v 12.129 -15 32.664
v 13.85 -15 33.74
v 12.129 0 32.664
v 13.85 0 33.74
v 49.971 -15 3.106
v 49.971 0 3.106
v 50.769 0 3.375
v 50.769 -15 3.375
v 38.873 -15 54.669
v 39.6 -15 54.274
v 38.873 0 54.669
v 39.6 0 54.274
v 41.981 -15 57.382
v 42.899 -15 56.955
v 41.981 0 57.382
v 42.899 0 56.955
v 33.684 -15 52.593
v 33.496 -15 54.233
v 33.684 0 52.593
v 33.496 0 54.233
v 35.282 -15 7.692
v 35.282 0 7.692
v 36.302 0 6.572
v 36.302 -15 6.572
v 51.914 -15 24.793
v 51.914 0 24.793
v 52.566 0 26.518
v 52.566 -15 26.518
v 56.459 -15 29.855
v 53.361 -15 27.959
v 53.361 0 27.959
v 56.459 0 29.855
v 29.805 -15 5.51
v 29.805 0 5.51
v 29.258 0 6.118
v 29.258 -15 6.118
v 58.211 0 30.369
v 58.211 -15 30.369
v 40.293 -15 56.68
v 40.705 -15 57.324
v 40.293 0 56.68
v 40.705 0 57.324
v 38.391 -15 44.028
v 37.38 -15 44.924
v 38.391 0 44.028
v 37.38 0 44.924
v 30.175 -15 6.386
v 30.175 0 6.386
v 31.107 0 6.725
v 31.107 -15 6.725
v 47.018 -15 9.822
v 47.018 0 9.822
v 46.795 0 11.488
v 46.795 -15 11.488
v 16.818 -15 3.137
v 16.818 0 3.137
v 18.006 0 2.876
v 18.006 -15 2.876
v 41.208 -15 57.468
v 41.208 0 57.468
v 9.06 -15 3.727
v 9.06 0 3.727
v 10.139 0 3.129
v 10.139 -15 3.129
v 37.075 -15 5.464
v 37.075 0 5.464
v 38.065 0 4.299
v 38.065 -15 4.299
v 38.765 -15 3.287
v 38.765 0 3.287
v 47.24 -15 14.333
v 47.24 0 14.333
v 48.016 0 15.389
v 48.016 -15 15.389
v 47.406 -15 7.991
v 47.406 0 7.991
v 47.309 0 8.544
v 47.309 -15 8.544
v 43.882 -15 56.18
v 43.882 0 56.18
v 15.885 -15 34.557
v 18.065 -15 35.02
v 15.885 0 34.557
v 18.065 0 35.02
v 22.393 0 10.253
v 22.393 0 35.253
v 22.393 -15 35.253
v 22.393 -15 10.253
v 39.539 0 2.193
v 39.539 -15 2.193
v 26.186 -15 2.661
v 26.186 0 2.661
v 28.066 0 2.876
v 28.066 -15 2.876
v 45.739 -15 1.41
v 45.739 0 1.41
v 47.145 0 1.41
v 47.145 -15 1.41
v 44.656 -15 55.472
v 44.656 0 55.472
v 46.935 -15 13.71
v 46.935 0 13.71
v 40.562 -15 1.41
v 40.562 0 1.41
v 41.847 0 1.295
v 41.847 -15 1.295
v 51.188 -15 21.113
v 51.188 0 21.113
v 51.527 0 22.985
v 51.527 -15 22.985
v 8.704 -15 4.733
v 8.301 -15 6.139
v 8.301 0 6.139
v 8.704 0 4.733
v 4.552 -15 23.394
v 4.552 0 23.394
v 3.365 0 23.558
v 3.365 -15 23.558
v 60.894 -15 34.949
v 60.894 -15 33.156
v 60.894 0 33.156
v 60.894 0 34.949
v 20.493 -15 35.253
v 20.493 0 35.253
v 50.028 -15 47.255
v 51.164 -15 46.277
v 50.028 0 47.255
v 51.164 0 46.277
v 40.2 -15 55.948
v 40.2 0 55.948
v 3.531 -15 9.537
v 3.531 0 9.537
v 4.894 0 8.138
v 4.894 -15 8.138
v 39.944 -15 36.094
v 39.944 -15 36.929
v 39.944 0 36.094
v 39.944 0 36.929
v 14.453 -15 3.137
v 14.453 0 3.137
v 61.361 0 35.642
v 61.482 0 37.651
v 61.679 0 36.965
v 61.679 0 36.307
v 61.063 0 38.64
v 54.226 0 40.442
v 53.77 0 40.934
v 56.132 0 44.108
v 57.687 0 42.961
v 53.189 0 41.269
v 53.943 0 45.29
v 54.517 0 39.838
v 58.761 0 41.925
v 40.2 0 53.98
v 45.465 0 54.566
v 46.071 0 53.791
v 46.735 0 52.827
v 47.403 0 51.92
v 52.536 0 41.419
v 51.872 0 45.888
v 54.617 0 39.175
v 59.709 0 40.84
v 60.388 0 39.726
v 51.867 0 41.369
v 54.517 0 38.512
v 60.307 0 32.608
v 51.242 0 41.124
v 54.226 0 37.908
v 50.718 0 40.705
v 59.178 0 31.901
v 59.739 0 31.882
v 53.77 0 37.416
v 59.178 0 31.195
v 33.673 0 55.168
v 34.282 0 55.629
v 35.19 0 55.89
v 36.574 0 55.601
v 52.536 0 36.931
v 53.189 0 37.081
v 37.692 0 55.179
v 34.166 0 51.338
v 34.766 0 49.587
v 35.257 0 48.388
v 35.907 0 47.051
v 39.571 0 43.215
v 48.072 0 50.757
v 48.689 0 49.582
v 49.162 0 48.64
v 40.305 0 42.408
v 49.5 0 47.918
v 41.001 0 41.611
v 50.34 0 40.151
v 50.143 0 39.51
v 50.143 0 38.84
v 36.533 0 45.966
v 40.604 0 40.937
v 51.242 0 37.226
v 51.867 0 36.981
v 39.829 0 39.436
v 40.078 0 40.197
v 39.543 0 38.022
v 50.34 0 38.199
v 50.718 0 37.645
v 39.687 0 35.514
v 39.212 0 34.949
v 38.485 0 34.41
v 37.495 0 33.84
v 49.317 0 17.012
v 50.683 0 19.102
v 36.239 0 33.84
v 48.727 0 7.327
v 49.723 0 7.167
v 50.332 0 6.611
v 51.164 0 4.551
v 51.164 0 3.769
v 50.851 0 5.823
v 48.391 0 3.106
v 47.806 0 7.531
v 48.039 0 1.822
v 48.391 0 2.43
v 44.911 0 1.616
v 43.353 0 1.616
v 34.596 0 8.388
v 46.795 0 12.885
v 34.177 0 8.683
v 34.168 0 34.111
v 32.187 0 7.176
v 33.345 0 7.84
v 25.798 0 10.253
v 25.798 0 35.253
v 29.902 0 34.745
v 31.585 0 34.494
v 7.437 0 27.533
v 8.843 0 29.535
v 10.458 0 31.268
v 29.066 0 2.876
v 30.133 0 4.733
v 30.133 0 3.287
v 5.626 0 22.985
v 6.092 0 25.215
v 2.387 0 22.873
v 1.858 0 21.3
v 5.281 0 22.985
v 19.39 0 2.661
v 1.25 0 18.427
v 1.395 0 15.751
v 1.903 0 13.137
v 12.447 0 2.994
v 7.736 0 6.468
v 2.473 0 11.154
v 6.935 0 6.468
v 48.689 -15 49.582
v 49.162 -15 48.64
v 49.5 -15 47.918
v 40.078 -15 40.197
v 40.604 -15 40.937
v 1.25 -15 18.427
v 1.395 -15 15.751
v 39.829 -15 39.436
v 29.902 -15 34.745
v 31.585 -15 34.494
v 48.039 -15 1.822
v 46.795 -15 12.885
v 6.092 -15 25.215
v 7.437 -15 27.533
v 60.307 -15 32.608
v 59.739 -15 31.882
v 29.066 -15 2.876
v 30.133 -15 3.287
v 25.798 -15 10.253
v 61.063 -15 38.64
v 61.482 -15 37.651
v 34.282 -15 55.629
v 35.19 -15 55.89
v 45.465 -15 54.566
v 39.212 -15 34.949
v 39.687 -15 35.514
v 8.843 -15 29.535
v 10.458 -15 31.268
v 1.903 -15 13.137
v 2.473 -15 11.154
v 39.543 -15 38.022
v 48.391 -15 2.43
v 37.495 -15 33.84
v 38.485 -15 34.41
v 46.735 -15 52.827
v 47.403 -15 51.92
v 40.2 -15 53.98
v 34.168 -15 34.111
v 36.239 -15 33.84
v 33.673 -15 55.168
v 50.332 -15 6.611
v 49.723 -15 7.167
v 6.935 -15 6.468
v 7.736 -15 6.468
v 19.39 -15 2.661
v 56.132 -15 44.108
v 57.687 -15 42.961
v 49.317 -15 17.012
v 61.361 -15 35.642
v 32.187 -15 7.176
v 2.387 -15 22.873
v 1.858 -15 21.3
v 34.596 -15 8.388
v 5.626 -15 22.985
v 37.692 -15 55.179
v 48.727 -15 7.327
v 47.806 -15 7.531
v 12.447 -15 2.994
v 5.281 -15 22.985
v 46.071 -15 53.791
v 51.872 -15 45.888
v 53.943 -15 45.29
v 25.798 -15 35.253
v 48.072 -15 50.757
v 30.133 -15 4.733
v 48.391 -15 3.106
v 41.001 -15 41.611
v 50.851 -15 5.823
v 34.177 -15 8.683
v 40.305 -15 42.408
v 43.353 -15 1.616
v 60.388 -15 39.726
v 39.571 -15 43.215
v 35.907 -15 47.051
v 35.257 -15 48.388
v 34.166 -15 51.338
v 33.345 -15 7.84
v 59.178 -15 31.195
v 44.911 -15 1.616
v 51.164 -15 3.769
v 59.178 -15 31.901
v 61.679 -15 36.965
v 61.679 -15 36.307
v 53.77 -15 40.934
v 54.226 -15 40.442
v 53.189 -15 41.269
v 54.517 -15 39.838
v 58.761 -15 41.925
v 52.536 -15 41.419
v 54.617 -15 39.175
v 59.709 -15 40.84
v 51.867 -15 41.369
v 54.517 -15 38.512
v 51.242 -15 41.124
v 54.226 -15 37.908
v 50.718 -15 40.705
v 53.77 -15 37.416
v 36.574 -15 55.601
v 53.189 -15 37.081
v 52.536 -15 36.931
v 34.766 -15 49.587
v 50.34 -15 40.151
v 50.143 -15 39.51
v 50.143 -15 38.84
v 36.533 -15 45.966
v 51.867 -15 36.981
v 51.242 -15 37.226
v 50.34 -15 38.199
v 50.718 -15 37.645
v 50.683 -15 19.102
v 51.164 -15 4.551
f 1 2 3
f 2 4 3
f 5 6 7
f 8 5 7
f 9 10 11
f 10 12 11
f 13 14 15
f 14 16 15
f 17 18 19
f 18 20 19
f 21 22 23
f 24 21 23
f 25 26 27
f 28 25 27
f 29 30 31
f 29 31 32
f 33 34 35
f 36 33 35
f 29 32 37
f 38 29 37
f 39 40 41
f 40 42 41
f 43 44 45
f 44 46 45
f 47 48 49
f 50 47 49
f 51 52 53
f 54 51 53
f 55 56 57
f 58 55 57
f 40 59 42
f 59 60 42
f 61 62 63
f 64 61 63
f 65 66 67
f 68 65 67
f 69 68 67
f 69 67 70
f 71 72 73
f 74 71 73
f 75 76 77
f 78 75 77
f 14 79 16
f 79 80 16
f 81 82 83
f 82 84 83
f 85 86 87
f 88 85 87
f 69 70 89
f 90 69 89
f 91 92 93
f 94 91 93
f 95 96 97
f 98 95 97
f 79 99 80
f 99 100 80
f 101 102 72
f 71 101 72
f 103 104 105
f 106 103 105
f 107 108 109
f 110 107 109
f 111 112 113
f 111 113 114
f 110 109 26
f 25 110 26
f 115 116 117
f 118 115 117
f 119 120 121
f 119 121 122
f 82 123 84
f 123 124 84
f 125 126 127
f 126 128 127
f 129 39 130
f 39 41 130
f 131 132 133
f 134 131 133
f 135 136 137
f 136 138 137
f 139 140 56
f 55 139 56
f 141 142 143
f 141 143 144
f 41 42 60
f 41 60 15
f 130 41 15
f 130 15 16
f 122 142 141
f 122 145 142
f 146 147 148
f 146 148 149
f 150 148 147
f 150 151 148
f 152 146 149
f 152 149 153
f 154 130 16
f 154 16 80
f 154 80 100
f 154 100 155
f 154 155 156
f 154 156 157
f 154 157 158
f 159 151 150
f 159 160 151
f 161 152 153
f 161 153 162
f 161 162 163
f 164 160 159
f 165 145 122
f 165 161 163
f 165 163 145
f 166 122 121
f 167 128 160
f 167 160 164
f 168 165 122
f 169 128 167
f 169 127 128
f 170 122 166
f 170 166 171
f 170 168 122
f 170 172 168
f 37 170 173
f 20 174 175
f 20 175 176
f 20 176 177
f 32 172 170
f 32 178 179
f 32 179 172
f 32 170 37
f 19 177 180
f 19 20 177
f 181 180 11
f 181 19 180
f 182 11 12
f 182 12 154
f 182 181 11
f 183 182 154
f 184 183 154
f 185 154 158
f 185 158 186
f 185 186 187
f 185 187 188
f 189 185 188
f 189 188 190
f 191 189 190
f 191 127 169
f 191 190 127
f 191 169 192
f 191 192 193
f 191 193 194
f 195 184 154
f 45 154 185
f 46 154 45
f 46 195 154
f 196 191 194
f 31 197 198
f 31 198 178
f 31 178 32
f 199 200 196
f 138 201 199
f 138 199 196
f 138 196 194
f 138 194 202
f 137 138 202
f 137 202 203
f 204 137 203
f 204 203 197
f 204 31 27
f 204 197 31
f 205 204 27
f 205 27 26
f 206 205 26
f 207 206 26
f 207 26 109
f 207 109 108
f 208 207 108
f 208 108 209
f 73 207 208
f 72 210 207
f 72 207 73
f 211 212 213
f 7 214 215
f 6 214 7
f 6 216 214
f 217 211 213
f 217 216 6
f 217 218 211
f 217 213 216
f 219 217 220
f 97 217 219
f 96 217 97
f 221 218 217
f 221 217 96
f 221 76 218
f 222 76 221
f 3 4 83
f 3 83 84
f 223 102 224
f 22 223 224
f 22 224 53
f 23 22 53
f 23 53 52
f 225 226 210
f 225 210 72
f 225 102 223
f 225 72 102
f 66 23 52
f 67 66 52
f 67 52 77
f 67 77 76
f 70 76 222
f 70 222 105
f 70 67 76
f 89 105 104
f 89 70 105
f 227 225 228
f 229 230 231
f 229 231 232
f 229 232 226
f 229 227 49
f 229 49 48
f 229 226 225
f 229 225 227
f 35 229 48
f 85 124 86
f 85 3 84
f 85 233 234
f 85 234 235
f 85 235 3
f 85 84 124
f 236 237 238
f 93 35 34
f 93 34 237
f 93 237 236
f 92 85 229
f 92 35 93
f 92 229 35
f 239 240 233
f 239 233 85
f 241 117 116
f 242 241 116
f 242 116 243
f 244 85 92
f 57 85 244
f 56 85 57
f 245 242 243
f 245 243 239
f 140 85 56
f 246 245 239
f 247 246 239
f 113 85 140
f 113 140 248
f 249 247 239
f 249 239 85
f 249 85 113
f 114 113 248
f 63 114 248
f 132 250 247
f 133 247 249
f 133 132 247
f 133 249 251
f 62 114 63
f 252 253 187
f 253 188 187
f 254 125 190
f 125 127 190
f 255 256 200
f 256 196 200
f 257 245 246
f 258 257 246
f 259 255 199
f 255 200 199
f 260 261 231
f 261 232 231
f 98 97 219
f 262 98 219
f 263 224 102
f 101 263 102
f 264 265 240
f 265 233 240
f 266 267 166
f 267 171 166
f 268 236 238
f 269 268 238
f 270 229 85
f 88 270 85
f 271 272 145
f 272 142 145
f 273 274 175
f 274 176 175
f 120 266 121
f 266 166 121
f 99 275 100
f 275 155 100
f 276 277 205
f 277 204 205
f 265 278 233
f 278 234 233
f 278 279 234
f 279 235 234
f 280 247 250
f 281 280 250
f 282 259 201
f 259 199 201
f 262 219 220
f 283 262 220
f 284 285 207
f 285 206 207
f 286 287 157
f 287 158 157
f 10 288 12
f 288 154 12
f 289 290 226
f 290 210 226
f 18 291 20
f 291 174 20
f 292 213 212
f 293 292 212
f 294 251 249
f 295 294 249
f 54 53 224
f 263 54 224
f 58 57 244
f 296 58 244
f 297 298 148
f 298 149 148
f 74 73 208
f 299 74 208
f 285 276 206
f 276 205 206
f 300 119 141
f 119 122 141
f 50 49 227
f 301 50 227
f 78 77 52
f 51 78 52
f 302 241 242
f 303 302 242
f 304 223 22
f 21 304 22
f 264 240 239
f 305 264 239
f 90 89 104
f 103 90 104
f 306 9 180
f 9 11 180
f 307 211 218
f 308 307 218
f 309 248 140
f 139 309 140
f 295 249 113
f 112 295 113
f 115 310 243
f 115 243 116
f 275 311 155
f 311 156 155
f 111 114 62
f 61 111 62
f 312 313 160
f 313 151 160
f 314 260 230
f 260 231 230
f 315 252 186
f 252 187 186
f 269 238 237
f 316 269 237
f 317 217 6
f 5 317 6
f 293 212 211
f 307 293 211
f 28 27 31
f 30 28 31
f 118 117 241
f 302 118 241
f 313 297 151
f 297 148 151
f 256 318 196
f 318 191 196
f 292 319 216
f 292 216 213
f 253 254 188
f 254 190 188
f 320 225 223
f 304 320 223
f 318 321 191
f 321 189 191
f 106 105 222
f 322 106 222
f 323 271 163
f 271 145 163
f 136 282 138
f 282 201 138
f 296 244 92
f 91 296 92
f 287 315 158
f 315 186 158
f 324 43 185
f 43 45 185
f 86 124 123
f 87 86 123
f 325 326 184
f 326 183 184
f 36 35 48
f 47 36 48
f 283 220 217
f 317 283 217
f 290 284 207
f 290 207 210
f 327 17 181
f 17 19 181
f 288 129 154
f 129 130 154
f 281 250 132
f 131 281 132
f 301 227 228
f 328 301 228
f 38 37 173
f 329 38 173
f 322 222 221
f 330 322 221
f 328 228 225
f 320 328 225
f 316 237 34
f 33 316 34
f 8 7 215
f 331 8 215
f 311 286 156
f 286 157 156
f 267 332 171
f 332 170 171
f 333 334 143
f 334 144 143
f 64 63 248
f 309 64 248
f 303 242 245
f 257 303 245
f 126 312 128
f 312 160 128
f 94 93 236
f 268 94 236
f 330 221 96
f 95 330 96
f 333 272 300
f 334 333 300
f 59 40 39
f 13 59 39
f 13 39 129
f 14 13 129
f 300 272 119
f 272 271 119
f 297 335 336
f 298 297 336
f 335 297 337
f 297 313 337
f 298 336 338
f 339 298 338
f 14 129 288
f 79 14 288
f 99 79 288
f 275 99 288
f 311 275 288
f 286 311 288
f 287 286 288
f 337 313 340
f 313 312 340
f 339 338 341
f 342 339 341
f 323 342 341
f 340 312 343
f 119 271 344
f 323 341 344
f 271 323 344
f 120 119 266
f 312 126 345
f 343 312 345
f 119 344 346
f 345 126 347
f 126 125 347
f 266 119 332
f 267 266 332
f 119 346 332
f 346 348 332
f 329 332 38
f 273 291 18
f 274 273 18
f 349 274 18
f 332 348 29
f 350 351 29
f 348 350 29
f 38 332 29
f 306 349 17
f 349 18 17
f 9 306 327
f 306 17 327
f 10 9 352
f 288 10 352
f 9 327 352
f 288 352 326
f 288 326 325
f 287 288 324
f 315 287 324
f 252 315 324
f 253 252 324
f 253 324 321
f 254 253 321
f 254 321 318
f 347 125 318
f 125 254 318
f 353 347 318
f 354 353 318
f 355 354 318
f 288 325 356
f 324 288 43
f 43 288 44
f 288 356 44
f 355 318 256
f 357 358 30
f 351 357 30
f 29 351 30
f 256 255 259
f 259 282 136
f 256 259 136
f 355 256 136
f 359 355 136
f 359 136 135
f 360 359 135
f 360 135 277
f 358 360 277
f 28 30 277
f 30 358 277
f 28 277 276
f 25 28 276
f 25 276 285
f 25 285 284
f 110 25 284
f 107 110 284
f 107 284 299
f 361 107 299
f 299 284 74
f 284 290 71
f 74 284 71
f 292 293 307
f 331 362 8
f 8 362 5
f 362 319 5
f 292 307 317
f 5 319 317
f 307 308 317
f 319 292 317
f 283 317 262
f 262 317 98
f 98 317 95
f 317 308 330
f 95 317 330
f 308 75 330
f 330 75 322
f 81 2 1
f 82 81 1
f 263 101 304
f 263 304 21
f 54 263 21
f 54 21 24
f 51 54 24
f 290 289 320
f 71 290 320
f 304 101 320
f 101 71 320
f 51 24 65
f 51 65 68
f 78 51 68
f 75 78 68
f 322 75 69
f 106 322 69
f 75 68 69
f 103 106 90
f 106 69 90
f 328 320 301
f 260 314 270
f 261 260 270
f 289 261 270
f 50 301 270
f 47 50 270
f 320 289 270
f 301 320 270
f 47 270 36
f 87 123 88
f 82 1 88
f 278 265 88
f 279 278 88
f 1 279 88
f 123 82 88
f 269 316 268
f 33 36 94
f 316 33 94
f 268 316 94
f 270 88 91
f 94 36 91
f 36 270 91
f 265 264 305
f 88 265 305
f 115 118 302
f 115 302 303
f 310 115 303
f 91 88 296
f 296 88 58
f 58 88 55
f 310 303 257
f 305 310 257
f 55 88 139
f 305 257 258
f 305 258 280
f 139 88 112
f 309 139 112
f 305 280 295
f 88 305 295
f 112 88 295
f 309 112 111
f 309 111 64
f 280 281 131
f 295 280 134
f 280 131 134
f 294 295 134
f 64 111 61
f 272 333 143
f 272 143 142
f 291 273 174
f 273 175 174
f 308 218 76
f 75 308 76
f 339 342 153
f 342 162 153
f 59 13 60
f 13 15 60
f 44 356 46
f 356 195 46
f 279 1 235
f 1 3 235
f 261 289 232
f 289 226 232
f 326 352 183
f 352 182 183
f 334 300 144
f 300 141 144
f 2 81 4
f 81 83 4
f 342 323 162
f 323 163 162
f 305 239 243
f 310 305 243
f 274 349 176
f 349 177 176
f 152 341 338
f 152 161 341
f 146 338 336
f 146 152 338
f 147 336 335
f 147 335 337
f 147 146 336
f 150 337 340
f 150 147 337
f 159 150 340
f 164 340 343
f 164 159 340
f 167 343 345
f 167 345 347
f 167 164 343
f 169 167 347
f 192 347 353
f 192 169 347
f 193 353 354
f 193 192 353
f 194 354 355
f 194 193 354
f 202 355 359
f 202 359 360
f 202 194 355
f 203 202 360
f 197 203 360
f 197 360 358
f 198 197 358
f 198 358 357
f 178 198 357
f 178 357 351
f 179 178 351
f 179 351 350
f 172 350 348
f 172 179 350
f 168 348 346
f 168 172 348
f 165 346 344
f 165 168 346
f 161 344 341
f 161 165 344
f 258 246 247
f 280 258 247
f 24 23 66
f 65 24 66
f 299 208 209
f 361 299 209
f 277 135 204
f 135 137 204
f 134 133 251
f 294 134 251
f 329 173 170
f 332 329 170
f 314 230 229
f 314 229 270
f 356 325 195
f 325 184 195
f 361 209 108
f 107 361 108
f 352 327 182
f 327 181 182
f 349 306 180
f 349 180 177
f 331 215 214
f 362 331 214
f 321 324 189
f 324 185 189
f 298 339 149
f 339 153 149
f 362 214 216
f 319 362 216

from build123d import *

# Parameters (mm, degrees)
F0_R     = 2.25
F1_DEPTH = 3
F2_DEPTH = 12
F3_DEPTH = 25
F4_DEPTH = 1.9
F5_R     = 1.0323234766
F6_DEPTH = 2


with BuildPart() as f1:
    # F0 (on Front) → F1 (new body)
    with BuildSketch(Plane.XZ):
        Polygon((59.1779698418, 31.194587481), (59.1779698418, 31.9005881237), (59.7388577371, 31.8816154154), (60.3070678192, 32.6076158289), (60.8939676434, 33.1560252645), (60.8939676434, 33.94444243), (60.8939676434, 34.9491785137), (61.3608548692, 35.6423513558), (61.6794760284, 36.3066197257), (61.6794760284, 36.964568034), (61.4824255283, 37.650985105), (61.0625805582, 38.6402383967), (60.3881708198, 39.7264862101), (59.7092475961, 40.8400280338), (58.7607938368, 41.9245535961), (57.6865458859, 42.9608735974), (56.131929641, 44.1080185295), (53.9428997059, 45.2900241974), (51.8717793367, 45.8880749855), (51.1641228177, 46.2767657275), (50.0276083315, 47.254787707), (49.500445814, 47.9175015095), (49.1623850594, 48.6403019596), (48.6890909202, 49.5821496811), (48.0721058512, 50.756745827), (47.4028453988, 51.9204250674), (46.7350661522, 52.8268286536), (46.0711401365, 53.7907023235), (45.4648239409, 54.5656838351), (44.6564314585, 55.4715389559), (43.8822848719, 56.1802155505), (42.8986280226, 56.9550049245), (41.9814228134, 57.3815747084), (41.2078828484, 57.4680692876), (40.7050007603, 57.323706376), (40.2931032973, 56.6803844909), (40.199734935, 55.9481483411), (40.199734935, 53.9804748212), (39.6002588357, 54.273896786), (38.8731125838, 54.6692215131), (37.691644901, 55.1789449292), (36.5735721249, 55.6012317928), (35.1899154237, 55.8898272879), (34.2816298321, 55.6290847487), (33.6731372422, 55.1684227791), (33.4962484397, 54.2325872158), (33.6837781683, 52.5928086281), (34.1659036474, 51.3379723538), (34.7663858487, 49.5873513683), (35.2569758596, 48.3876865141), (35.9067640461, 47.0506118809), (36.5332756434, 45.9664146991), (37.3798895218, 44.924222276), (38.3908508618, 44.0280229397), (39.5714766328, 43.2154907668), (40.3047049111, 42.4076781904), (41.0011964924, 41.6110026044), (40.6037128381, 40.9368513783), (40.0780839274, 40.1968563654), (39.8294614492, 39.436208314), (39.5429389686, 38.0218070561), (39.9435562115, 36.928816962), (39.9435562115, 36.0942029461), (39.6868255292, 35.5139231333), (39.2115087057, 34.9491785137), (38.4849423599, 34.4103130735), (37.4947947552, 33.8397134992), (36.2388370964, 33.8397134992), (34.1682477254, 34.1105470766), (31.5846720936, 34.4943121109), (29.9018896319, 34.7448454842), (25.7982475776, 35.2533147662), (22.9338105357, 35.2533147662), (20.4925913511, 35.2533147662), (18.0653283384, 35.0201785734), (15.8854493902, 34.5568092112), (13.8497609292, 33.7397600595), (12.1293465844, 32.6644815528), (10.4578391027, 31.2680783419), (8.8429108853, 29.5349174183), (7.4372964263, 27.5334818399), (6.0921336762, 25.2153127735), (5.626352988, 22.9853138756), (5.2811054162, 22.9853138756), (4.5523054715, 23.3941563518), (3.3652996425, 23.5582872219), (2.3869021215, 22.8734776027), (1.8580647324, 21.2996615779), (1.2503211514, 18.4274045382), (1.3953504937, 15.7512989625), (1.9034004358, 13.1371476651), (2.4727079067, 11.1539892033), (3.5306752582, 9.5370138477), (4.8935674994, 8.138209791), (6.9346738022, 6.4682455231), (7.7356851464, 6.4682455231), (8.3006708113, 6.139061086), (8.7042880198, 4.7330776356), (9.059931979, 3.7272284641), (10.1391117511, 3.1285394737), (12.4473123728, 2.994476163), (14.4526387363, 3.1366197305), (16.8182124996, 3.1366197305), (18.0060434283, 2.8763879966), (19.3903542013, 2.6614952628), (21.883129127, 2.6614952628), (23.7435637012, 2.6614952628), (26.1859881122, 2.6614952628), (28.06579015, 2.8763879966), (29.066299208, 2.8763879966), (30.1331987714, 3.287266694), (30.1331987714, 3.5115652152), (30.1331987714, 4.0722664313), (30.1331987714, 4.7332313456), (29.8045038484, 5.5102918726), (29.2580751761, 6.1180421129), (30.1753048391, 6.385948213), (31.1070111921, 6.7245609263), (32.1866285138, 7.1757989864), (33.3447322722, 7.8400621162), (34.1773899787, 8.6830629355), (34.5961799391, 8.3883274486), (35.2824532969, 7.6921380472), (36.3022424833, 6.5724259885), (37.0747716212, 5.4643229671), (38.0653628889, 4.2985577244), (38.7650963545, 3.287266694), (39.5393966511, 2.1927098055), (40.5617639739, 1.4101439923), (41.8474854837, 1.29517555), (43.3533756495, 1.6162313684), (44.9111674038, 1.6162313684), (45.7386897979, 1.4101439923), (47.1447348197, 1.4101439923), (48.0390547016, 1.8218246455), (48.391113549, 2.4300583955), (48.391113549, 3.1064440938), (49.9711618169, 3.1064440938), (50.7690600963, 3.3749897061), (51.1641228177, 3.7687113949), (51.1641228177, 4.5507251402), (50.8511063176, 5.8227389469), (50.331727117, 6.6105731496), (49.7232345272, 7.1669628431), (48.7272878623, 7.3274251963), (47.8059953638, 7.5314743863), (47.4058916521, 7.9913136579), (47.3091591362, 8.5442592861), (47.0176340929, 9.8221136372), (46.7949781293, 11.4877626708), (46.7949781293, 12.8848767905), (46.9349625513, 13.7100262861), (47.2396647362, 14.3331588828), (48.0156837904, 15.3890061712), (49.3168950791, 17.0124460815), (50.682930079, 19.1019749735), (51.1880177404, 21.1130785633), (51.5269728079, 22.9853138756), (51.9142522124, 24.7934957735), (52.5664263977, 26.5176664071), (53.3611806084, 27.9593477017), (56.4587800437, 29.8548648433), (58.2113468584, 30.3689550216), align=None)
        with Locations((52.3673893774, 39.17497812)):
            Circle(F0_R, mode=Mode.SUBTRACT)
    extrude(amount=F1_DEPTH)

    # F2 (add): a face of the model
    f2_faces = [f1.faces().sort_by_distance(p)[0] for p in [
        (31.8904414267, -3, 24.0565595855),
    ]]
    extrude(f2_faces, amount=F2_DEPTH)

    # F3 (cut): a face of the model
    f3_faces = [f1.faces().sort_by_distance(p)[0] for p in [
        (23.1454194643, -7.5, 35.2533147662),
    ]]
    extrude(f3_faces, amount=-F3_DEPTH, mode=Mode.SUBTRACT)

    # F4 (add): a face of the model
    f4_faces = [f1.faces().sort_by_distance(p)[0] for p in [
        (20.4925913511, -7.5, 22.7533147662),
    ]]
    extrude(f4_faces, amount=F4_DEPTH)

    # F5 (on face) → F6 (join)
    with BuildSketch(Plane.XZ.offset(15)):
        with Locations((41.8074317276, 54.3998554349)):
            Circle(F5_R)
    extrude(amount=-F6_DEPTH)


solid = f1.part
